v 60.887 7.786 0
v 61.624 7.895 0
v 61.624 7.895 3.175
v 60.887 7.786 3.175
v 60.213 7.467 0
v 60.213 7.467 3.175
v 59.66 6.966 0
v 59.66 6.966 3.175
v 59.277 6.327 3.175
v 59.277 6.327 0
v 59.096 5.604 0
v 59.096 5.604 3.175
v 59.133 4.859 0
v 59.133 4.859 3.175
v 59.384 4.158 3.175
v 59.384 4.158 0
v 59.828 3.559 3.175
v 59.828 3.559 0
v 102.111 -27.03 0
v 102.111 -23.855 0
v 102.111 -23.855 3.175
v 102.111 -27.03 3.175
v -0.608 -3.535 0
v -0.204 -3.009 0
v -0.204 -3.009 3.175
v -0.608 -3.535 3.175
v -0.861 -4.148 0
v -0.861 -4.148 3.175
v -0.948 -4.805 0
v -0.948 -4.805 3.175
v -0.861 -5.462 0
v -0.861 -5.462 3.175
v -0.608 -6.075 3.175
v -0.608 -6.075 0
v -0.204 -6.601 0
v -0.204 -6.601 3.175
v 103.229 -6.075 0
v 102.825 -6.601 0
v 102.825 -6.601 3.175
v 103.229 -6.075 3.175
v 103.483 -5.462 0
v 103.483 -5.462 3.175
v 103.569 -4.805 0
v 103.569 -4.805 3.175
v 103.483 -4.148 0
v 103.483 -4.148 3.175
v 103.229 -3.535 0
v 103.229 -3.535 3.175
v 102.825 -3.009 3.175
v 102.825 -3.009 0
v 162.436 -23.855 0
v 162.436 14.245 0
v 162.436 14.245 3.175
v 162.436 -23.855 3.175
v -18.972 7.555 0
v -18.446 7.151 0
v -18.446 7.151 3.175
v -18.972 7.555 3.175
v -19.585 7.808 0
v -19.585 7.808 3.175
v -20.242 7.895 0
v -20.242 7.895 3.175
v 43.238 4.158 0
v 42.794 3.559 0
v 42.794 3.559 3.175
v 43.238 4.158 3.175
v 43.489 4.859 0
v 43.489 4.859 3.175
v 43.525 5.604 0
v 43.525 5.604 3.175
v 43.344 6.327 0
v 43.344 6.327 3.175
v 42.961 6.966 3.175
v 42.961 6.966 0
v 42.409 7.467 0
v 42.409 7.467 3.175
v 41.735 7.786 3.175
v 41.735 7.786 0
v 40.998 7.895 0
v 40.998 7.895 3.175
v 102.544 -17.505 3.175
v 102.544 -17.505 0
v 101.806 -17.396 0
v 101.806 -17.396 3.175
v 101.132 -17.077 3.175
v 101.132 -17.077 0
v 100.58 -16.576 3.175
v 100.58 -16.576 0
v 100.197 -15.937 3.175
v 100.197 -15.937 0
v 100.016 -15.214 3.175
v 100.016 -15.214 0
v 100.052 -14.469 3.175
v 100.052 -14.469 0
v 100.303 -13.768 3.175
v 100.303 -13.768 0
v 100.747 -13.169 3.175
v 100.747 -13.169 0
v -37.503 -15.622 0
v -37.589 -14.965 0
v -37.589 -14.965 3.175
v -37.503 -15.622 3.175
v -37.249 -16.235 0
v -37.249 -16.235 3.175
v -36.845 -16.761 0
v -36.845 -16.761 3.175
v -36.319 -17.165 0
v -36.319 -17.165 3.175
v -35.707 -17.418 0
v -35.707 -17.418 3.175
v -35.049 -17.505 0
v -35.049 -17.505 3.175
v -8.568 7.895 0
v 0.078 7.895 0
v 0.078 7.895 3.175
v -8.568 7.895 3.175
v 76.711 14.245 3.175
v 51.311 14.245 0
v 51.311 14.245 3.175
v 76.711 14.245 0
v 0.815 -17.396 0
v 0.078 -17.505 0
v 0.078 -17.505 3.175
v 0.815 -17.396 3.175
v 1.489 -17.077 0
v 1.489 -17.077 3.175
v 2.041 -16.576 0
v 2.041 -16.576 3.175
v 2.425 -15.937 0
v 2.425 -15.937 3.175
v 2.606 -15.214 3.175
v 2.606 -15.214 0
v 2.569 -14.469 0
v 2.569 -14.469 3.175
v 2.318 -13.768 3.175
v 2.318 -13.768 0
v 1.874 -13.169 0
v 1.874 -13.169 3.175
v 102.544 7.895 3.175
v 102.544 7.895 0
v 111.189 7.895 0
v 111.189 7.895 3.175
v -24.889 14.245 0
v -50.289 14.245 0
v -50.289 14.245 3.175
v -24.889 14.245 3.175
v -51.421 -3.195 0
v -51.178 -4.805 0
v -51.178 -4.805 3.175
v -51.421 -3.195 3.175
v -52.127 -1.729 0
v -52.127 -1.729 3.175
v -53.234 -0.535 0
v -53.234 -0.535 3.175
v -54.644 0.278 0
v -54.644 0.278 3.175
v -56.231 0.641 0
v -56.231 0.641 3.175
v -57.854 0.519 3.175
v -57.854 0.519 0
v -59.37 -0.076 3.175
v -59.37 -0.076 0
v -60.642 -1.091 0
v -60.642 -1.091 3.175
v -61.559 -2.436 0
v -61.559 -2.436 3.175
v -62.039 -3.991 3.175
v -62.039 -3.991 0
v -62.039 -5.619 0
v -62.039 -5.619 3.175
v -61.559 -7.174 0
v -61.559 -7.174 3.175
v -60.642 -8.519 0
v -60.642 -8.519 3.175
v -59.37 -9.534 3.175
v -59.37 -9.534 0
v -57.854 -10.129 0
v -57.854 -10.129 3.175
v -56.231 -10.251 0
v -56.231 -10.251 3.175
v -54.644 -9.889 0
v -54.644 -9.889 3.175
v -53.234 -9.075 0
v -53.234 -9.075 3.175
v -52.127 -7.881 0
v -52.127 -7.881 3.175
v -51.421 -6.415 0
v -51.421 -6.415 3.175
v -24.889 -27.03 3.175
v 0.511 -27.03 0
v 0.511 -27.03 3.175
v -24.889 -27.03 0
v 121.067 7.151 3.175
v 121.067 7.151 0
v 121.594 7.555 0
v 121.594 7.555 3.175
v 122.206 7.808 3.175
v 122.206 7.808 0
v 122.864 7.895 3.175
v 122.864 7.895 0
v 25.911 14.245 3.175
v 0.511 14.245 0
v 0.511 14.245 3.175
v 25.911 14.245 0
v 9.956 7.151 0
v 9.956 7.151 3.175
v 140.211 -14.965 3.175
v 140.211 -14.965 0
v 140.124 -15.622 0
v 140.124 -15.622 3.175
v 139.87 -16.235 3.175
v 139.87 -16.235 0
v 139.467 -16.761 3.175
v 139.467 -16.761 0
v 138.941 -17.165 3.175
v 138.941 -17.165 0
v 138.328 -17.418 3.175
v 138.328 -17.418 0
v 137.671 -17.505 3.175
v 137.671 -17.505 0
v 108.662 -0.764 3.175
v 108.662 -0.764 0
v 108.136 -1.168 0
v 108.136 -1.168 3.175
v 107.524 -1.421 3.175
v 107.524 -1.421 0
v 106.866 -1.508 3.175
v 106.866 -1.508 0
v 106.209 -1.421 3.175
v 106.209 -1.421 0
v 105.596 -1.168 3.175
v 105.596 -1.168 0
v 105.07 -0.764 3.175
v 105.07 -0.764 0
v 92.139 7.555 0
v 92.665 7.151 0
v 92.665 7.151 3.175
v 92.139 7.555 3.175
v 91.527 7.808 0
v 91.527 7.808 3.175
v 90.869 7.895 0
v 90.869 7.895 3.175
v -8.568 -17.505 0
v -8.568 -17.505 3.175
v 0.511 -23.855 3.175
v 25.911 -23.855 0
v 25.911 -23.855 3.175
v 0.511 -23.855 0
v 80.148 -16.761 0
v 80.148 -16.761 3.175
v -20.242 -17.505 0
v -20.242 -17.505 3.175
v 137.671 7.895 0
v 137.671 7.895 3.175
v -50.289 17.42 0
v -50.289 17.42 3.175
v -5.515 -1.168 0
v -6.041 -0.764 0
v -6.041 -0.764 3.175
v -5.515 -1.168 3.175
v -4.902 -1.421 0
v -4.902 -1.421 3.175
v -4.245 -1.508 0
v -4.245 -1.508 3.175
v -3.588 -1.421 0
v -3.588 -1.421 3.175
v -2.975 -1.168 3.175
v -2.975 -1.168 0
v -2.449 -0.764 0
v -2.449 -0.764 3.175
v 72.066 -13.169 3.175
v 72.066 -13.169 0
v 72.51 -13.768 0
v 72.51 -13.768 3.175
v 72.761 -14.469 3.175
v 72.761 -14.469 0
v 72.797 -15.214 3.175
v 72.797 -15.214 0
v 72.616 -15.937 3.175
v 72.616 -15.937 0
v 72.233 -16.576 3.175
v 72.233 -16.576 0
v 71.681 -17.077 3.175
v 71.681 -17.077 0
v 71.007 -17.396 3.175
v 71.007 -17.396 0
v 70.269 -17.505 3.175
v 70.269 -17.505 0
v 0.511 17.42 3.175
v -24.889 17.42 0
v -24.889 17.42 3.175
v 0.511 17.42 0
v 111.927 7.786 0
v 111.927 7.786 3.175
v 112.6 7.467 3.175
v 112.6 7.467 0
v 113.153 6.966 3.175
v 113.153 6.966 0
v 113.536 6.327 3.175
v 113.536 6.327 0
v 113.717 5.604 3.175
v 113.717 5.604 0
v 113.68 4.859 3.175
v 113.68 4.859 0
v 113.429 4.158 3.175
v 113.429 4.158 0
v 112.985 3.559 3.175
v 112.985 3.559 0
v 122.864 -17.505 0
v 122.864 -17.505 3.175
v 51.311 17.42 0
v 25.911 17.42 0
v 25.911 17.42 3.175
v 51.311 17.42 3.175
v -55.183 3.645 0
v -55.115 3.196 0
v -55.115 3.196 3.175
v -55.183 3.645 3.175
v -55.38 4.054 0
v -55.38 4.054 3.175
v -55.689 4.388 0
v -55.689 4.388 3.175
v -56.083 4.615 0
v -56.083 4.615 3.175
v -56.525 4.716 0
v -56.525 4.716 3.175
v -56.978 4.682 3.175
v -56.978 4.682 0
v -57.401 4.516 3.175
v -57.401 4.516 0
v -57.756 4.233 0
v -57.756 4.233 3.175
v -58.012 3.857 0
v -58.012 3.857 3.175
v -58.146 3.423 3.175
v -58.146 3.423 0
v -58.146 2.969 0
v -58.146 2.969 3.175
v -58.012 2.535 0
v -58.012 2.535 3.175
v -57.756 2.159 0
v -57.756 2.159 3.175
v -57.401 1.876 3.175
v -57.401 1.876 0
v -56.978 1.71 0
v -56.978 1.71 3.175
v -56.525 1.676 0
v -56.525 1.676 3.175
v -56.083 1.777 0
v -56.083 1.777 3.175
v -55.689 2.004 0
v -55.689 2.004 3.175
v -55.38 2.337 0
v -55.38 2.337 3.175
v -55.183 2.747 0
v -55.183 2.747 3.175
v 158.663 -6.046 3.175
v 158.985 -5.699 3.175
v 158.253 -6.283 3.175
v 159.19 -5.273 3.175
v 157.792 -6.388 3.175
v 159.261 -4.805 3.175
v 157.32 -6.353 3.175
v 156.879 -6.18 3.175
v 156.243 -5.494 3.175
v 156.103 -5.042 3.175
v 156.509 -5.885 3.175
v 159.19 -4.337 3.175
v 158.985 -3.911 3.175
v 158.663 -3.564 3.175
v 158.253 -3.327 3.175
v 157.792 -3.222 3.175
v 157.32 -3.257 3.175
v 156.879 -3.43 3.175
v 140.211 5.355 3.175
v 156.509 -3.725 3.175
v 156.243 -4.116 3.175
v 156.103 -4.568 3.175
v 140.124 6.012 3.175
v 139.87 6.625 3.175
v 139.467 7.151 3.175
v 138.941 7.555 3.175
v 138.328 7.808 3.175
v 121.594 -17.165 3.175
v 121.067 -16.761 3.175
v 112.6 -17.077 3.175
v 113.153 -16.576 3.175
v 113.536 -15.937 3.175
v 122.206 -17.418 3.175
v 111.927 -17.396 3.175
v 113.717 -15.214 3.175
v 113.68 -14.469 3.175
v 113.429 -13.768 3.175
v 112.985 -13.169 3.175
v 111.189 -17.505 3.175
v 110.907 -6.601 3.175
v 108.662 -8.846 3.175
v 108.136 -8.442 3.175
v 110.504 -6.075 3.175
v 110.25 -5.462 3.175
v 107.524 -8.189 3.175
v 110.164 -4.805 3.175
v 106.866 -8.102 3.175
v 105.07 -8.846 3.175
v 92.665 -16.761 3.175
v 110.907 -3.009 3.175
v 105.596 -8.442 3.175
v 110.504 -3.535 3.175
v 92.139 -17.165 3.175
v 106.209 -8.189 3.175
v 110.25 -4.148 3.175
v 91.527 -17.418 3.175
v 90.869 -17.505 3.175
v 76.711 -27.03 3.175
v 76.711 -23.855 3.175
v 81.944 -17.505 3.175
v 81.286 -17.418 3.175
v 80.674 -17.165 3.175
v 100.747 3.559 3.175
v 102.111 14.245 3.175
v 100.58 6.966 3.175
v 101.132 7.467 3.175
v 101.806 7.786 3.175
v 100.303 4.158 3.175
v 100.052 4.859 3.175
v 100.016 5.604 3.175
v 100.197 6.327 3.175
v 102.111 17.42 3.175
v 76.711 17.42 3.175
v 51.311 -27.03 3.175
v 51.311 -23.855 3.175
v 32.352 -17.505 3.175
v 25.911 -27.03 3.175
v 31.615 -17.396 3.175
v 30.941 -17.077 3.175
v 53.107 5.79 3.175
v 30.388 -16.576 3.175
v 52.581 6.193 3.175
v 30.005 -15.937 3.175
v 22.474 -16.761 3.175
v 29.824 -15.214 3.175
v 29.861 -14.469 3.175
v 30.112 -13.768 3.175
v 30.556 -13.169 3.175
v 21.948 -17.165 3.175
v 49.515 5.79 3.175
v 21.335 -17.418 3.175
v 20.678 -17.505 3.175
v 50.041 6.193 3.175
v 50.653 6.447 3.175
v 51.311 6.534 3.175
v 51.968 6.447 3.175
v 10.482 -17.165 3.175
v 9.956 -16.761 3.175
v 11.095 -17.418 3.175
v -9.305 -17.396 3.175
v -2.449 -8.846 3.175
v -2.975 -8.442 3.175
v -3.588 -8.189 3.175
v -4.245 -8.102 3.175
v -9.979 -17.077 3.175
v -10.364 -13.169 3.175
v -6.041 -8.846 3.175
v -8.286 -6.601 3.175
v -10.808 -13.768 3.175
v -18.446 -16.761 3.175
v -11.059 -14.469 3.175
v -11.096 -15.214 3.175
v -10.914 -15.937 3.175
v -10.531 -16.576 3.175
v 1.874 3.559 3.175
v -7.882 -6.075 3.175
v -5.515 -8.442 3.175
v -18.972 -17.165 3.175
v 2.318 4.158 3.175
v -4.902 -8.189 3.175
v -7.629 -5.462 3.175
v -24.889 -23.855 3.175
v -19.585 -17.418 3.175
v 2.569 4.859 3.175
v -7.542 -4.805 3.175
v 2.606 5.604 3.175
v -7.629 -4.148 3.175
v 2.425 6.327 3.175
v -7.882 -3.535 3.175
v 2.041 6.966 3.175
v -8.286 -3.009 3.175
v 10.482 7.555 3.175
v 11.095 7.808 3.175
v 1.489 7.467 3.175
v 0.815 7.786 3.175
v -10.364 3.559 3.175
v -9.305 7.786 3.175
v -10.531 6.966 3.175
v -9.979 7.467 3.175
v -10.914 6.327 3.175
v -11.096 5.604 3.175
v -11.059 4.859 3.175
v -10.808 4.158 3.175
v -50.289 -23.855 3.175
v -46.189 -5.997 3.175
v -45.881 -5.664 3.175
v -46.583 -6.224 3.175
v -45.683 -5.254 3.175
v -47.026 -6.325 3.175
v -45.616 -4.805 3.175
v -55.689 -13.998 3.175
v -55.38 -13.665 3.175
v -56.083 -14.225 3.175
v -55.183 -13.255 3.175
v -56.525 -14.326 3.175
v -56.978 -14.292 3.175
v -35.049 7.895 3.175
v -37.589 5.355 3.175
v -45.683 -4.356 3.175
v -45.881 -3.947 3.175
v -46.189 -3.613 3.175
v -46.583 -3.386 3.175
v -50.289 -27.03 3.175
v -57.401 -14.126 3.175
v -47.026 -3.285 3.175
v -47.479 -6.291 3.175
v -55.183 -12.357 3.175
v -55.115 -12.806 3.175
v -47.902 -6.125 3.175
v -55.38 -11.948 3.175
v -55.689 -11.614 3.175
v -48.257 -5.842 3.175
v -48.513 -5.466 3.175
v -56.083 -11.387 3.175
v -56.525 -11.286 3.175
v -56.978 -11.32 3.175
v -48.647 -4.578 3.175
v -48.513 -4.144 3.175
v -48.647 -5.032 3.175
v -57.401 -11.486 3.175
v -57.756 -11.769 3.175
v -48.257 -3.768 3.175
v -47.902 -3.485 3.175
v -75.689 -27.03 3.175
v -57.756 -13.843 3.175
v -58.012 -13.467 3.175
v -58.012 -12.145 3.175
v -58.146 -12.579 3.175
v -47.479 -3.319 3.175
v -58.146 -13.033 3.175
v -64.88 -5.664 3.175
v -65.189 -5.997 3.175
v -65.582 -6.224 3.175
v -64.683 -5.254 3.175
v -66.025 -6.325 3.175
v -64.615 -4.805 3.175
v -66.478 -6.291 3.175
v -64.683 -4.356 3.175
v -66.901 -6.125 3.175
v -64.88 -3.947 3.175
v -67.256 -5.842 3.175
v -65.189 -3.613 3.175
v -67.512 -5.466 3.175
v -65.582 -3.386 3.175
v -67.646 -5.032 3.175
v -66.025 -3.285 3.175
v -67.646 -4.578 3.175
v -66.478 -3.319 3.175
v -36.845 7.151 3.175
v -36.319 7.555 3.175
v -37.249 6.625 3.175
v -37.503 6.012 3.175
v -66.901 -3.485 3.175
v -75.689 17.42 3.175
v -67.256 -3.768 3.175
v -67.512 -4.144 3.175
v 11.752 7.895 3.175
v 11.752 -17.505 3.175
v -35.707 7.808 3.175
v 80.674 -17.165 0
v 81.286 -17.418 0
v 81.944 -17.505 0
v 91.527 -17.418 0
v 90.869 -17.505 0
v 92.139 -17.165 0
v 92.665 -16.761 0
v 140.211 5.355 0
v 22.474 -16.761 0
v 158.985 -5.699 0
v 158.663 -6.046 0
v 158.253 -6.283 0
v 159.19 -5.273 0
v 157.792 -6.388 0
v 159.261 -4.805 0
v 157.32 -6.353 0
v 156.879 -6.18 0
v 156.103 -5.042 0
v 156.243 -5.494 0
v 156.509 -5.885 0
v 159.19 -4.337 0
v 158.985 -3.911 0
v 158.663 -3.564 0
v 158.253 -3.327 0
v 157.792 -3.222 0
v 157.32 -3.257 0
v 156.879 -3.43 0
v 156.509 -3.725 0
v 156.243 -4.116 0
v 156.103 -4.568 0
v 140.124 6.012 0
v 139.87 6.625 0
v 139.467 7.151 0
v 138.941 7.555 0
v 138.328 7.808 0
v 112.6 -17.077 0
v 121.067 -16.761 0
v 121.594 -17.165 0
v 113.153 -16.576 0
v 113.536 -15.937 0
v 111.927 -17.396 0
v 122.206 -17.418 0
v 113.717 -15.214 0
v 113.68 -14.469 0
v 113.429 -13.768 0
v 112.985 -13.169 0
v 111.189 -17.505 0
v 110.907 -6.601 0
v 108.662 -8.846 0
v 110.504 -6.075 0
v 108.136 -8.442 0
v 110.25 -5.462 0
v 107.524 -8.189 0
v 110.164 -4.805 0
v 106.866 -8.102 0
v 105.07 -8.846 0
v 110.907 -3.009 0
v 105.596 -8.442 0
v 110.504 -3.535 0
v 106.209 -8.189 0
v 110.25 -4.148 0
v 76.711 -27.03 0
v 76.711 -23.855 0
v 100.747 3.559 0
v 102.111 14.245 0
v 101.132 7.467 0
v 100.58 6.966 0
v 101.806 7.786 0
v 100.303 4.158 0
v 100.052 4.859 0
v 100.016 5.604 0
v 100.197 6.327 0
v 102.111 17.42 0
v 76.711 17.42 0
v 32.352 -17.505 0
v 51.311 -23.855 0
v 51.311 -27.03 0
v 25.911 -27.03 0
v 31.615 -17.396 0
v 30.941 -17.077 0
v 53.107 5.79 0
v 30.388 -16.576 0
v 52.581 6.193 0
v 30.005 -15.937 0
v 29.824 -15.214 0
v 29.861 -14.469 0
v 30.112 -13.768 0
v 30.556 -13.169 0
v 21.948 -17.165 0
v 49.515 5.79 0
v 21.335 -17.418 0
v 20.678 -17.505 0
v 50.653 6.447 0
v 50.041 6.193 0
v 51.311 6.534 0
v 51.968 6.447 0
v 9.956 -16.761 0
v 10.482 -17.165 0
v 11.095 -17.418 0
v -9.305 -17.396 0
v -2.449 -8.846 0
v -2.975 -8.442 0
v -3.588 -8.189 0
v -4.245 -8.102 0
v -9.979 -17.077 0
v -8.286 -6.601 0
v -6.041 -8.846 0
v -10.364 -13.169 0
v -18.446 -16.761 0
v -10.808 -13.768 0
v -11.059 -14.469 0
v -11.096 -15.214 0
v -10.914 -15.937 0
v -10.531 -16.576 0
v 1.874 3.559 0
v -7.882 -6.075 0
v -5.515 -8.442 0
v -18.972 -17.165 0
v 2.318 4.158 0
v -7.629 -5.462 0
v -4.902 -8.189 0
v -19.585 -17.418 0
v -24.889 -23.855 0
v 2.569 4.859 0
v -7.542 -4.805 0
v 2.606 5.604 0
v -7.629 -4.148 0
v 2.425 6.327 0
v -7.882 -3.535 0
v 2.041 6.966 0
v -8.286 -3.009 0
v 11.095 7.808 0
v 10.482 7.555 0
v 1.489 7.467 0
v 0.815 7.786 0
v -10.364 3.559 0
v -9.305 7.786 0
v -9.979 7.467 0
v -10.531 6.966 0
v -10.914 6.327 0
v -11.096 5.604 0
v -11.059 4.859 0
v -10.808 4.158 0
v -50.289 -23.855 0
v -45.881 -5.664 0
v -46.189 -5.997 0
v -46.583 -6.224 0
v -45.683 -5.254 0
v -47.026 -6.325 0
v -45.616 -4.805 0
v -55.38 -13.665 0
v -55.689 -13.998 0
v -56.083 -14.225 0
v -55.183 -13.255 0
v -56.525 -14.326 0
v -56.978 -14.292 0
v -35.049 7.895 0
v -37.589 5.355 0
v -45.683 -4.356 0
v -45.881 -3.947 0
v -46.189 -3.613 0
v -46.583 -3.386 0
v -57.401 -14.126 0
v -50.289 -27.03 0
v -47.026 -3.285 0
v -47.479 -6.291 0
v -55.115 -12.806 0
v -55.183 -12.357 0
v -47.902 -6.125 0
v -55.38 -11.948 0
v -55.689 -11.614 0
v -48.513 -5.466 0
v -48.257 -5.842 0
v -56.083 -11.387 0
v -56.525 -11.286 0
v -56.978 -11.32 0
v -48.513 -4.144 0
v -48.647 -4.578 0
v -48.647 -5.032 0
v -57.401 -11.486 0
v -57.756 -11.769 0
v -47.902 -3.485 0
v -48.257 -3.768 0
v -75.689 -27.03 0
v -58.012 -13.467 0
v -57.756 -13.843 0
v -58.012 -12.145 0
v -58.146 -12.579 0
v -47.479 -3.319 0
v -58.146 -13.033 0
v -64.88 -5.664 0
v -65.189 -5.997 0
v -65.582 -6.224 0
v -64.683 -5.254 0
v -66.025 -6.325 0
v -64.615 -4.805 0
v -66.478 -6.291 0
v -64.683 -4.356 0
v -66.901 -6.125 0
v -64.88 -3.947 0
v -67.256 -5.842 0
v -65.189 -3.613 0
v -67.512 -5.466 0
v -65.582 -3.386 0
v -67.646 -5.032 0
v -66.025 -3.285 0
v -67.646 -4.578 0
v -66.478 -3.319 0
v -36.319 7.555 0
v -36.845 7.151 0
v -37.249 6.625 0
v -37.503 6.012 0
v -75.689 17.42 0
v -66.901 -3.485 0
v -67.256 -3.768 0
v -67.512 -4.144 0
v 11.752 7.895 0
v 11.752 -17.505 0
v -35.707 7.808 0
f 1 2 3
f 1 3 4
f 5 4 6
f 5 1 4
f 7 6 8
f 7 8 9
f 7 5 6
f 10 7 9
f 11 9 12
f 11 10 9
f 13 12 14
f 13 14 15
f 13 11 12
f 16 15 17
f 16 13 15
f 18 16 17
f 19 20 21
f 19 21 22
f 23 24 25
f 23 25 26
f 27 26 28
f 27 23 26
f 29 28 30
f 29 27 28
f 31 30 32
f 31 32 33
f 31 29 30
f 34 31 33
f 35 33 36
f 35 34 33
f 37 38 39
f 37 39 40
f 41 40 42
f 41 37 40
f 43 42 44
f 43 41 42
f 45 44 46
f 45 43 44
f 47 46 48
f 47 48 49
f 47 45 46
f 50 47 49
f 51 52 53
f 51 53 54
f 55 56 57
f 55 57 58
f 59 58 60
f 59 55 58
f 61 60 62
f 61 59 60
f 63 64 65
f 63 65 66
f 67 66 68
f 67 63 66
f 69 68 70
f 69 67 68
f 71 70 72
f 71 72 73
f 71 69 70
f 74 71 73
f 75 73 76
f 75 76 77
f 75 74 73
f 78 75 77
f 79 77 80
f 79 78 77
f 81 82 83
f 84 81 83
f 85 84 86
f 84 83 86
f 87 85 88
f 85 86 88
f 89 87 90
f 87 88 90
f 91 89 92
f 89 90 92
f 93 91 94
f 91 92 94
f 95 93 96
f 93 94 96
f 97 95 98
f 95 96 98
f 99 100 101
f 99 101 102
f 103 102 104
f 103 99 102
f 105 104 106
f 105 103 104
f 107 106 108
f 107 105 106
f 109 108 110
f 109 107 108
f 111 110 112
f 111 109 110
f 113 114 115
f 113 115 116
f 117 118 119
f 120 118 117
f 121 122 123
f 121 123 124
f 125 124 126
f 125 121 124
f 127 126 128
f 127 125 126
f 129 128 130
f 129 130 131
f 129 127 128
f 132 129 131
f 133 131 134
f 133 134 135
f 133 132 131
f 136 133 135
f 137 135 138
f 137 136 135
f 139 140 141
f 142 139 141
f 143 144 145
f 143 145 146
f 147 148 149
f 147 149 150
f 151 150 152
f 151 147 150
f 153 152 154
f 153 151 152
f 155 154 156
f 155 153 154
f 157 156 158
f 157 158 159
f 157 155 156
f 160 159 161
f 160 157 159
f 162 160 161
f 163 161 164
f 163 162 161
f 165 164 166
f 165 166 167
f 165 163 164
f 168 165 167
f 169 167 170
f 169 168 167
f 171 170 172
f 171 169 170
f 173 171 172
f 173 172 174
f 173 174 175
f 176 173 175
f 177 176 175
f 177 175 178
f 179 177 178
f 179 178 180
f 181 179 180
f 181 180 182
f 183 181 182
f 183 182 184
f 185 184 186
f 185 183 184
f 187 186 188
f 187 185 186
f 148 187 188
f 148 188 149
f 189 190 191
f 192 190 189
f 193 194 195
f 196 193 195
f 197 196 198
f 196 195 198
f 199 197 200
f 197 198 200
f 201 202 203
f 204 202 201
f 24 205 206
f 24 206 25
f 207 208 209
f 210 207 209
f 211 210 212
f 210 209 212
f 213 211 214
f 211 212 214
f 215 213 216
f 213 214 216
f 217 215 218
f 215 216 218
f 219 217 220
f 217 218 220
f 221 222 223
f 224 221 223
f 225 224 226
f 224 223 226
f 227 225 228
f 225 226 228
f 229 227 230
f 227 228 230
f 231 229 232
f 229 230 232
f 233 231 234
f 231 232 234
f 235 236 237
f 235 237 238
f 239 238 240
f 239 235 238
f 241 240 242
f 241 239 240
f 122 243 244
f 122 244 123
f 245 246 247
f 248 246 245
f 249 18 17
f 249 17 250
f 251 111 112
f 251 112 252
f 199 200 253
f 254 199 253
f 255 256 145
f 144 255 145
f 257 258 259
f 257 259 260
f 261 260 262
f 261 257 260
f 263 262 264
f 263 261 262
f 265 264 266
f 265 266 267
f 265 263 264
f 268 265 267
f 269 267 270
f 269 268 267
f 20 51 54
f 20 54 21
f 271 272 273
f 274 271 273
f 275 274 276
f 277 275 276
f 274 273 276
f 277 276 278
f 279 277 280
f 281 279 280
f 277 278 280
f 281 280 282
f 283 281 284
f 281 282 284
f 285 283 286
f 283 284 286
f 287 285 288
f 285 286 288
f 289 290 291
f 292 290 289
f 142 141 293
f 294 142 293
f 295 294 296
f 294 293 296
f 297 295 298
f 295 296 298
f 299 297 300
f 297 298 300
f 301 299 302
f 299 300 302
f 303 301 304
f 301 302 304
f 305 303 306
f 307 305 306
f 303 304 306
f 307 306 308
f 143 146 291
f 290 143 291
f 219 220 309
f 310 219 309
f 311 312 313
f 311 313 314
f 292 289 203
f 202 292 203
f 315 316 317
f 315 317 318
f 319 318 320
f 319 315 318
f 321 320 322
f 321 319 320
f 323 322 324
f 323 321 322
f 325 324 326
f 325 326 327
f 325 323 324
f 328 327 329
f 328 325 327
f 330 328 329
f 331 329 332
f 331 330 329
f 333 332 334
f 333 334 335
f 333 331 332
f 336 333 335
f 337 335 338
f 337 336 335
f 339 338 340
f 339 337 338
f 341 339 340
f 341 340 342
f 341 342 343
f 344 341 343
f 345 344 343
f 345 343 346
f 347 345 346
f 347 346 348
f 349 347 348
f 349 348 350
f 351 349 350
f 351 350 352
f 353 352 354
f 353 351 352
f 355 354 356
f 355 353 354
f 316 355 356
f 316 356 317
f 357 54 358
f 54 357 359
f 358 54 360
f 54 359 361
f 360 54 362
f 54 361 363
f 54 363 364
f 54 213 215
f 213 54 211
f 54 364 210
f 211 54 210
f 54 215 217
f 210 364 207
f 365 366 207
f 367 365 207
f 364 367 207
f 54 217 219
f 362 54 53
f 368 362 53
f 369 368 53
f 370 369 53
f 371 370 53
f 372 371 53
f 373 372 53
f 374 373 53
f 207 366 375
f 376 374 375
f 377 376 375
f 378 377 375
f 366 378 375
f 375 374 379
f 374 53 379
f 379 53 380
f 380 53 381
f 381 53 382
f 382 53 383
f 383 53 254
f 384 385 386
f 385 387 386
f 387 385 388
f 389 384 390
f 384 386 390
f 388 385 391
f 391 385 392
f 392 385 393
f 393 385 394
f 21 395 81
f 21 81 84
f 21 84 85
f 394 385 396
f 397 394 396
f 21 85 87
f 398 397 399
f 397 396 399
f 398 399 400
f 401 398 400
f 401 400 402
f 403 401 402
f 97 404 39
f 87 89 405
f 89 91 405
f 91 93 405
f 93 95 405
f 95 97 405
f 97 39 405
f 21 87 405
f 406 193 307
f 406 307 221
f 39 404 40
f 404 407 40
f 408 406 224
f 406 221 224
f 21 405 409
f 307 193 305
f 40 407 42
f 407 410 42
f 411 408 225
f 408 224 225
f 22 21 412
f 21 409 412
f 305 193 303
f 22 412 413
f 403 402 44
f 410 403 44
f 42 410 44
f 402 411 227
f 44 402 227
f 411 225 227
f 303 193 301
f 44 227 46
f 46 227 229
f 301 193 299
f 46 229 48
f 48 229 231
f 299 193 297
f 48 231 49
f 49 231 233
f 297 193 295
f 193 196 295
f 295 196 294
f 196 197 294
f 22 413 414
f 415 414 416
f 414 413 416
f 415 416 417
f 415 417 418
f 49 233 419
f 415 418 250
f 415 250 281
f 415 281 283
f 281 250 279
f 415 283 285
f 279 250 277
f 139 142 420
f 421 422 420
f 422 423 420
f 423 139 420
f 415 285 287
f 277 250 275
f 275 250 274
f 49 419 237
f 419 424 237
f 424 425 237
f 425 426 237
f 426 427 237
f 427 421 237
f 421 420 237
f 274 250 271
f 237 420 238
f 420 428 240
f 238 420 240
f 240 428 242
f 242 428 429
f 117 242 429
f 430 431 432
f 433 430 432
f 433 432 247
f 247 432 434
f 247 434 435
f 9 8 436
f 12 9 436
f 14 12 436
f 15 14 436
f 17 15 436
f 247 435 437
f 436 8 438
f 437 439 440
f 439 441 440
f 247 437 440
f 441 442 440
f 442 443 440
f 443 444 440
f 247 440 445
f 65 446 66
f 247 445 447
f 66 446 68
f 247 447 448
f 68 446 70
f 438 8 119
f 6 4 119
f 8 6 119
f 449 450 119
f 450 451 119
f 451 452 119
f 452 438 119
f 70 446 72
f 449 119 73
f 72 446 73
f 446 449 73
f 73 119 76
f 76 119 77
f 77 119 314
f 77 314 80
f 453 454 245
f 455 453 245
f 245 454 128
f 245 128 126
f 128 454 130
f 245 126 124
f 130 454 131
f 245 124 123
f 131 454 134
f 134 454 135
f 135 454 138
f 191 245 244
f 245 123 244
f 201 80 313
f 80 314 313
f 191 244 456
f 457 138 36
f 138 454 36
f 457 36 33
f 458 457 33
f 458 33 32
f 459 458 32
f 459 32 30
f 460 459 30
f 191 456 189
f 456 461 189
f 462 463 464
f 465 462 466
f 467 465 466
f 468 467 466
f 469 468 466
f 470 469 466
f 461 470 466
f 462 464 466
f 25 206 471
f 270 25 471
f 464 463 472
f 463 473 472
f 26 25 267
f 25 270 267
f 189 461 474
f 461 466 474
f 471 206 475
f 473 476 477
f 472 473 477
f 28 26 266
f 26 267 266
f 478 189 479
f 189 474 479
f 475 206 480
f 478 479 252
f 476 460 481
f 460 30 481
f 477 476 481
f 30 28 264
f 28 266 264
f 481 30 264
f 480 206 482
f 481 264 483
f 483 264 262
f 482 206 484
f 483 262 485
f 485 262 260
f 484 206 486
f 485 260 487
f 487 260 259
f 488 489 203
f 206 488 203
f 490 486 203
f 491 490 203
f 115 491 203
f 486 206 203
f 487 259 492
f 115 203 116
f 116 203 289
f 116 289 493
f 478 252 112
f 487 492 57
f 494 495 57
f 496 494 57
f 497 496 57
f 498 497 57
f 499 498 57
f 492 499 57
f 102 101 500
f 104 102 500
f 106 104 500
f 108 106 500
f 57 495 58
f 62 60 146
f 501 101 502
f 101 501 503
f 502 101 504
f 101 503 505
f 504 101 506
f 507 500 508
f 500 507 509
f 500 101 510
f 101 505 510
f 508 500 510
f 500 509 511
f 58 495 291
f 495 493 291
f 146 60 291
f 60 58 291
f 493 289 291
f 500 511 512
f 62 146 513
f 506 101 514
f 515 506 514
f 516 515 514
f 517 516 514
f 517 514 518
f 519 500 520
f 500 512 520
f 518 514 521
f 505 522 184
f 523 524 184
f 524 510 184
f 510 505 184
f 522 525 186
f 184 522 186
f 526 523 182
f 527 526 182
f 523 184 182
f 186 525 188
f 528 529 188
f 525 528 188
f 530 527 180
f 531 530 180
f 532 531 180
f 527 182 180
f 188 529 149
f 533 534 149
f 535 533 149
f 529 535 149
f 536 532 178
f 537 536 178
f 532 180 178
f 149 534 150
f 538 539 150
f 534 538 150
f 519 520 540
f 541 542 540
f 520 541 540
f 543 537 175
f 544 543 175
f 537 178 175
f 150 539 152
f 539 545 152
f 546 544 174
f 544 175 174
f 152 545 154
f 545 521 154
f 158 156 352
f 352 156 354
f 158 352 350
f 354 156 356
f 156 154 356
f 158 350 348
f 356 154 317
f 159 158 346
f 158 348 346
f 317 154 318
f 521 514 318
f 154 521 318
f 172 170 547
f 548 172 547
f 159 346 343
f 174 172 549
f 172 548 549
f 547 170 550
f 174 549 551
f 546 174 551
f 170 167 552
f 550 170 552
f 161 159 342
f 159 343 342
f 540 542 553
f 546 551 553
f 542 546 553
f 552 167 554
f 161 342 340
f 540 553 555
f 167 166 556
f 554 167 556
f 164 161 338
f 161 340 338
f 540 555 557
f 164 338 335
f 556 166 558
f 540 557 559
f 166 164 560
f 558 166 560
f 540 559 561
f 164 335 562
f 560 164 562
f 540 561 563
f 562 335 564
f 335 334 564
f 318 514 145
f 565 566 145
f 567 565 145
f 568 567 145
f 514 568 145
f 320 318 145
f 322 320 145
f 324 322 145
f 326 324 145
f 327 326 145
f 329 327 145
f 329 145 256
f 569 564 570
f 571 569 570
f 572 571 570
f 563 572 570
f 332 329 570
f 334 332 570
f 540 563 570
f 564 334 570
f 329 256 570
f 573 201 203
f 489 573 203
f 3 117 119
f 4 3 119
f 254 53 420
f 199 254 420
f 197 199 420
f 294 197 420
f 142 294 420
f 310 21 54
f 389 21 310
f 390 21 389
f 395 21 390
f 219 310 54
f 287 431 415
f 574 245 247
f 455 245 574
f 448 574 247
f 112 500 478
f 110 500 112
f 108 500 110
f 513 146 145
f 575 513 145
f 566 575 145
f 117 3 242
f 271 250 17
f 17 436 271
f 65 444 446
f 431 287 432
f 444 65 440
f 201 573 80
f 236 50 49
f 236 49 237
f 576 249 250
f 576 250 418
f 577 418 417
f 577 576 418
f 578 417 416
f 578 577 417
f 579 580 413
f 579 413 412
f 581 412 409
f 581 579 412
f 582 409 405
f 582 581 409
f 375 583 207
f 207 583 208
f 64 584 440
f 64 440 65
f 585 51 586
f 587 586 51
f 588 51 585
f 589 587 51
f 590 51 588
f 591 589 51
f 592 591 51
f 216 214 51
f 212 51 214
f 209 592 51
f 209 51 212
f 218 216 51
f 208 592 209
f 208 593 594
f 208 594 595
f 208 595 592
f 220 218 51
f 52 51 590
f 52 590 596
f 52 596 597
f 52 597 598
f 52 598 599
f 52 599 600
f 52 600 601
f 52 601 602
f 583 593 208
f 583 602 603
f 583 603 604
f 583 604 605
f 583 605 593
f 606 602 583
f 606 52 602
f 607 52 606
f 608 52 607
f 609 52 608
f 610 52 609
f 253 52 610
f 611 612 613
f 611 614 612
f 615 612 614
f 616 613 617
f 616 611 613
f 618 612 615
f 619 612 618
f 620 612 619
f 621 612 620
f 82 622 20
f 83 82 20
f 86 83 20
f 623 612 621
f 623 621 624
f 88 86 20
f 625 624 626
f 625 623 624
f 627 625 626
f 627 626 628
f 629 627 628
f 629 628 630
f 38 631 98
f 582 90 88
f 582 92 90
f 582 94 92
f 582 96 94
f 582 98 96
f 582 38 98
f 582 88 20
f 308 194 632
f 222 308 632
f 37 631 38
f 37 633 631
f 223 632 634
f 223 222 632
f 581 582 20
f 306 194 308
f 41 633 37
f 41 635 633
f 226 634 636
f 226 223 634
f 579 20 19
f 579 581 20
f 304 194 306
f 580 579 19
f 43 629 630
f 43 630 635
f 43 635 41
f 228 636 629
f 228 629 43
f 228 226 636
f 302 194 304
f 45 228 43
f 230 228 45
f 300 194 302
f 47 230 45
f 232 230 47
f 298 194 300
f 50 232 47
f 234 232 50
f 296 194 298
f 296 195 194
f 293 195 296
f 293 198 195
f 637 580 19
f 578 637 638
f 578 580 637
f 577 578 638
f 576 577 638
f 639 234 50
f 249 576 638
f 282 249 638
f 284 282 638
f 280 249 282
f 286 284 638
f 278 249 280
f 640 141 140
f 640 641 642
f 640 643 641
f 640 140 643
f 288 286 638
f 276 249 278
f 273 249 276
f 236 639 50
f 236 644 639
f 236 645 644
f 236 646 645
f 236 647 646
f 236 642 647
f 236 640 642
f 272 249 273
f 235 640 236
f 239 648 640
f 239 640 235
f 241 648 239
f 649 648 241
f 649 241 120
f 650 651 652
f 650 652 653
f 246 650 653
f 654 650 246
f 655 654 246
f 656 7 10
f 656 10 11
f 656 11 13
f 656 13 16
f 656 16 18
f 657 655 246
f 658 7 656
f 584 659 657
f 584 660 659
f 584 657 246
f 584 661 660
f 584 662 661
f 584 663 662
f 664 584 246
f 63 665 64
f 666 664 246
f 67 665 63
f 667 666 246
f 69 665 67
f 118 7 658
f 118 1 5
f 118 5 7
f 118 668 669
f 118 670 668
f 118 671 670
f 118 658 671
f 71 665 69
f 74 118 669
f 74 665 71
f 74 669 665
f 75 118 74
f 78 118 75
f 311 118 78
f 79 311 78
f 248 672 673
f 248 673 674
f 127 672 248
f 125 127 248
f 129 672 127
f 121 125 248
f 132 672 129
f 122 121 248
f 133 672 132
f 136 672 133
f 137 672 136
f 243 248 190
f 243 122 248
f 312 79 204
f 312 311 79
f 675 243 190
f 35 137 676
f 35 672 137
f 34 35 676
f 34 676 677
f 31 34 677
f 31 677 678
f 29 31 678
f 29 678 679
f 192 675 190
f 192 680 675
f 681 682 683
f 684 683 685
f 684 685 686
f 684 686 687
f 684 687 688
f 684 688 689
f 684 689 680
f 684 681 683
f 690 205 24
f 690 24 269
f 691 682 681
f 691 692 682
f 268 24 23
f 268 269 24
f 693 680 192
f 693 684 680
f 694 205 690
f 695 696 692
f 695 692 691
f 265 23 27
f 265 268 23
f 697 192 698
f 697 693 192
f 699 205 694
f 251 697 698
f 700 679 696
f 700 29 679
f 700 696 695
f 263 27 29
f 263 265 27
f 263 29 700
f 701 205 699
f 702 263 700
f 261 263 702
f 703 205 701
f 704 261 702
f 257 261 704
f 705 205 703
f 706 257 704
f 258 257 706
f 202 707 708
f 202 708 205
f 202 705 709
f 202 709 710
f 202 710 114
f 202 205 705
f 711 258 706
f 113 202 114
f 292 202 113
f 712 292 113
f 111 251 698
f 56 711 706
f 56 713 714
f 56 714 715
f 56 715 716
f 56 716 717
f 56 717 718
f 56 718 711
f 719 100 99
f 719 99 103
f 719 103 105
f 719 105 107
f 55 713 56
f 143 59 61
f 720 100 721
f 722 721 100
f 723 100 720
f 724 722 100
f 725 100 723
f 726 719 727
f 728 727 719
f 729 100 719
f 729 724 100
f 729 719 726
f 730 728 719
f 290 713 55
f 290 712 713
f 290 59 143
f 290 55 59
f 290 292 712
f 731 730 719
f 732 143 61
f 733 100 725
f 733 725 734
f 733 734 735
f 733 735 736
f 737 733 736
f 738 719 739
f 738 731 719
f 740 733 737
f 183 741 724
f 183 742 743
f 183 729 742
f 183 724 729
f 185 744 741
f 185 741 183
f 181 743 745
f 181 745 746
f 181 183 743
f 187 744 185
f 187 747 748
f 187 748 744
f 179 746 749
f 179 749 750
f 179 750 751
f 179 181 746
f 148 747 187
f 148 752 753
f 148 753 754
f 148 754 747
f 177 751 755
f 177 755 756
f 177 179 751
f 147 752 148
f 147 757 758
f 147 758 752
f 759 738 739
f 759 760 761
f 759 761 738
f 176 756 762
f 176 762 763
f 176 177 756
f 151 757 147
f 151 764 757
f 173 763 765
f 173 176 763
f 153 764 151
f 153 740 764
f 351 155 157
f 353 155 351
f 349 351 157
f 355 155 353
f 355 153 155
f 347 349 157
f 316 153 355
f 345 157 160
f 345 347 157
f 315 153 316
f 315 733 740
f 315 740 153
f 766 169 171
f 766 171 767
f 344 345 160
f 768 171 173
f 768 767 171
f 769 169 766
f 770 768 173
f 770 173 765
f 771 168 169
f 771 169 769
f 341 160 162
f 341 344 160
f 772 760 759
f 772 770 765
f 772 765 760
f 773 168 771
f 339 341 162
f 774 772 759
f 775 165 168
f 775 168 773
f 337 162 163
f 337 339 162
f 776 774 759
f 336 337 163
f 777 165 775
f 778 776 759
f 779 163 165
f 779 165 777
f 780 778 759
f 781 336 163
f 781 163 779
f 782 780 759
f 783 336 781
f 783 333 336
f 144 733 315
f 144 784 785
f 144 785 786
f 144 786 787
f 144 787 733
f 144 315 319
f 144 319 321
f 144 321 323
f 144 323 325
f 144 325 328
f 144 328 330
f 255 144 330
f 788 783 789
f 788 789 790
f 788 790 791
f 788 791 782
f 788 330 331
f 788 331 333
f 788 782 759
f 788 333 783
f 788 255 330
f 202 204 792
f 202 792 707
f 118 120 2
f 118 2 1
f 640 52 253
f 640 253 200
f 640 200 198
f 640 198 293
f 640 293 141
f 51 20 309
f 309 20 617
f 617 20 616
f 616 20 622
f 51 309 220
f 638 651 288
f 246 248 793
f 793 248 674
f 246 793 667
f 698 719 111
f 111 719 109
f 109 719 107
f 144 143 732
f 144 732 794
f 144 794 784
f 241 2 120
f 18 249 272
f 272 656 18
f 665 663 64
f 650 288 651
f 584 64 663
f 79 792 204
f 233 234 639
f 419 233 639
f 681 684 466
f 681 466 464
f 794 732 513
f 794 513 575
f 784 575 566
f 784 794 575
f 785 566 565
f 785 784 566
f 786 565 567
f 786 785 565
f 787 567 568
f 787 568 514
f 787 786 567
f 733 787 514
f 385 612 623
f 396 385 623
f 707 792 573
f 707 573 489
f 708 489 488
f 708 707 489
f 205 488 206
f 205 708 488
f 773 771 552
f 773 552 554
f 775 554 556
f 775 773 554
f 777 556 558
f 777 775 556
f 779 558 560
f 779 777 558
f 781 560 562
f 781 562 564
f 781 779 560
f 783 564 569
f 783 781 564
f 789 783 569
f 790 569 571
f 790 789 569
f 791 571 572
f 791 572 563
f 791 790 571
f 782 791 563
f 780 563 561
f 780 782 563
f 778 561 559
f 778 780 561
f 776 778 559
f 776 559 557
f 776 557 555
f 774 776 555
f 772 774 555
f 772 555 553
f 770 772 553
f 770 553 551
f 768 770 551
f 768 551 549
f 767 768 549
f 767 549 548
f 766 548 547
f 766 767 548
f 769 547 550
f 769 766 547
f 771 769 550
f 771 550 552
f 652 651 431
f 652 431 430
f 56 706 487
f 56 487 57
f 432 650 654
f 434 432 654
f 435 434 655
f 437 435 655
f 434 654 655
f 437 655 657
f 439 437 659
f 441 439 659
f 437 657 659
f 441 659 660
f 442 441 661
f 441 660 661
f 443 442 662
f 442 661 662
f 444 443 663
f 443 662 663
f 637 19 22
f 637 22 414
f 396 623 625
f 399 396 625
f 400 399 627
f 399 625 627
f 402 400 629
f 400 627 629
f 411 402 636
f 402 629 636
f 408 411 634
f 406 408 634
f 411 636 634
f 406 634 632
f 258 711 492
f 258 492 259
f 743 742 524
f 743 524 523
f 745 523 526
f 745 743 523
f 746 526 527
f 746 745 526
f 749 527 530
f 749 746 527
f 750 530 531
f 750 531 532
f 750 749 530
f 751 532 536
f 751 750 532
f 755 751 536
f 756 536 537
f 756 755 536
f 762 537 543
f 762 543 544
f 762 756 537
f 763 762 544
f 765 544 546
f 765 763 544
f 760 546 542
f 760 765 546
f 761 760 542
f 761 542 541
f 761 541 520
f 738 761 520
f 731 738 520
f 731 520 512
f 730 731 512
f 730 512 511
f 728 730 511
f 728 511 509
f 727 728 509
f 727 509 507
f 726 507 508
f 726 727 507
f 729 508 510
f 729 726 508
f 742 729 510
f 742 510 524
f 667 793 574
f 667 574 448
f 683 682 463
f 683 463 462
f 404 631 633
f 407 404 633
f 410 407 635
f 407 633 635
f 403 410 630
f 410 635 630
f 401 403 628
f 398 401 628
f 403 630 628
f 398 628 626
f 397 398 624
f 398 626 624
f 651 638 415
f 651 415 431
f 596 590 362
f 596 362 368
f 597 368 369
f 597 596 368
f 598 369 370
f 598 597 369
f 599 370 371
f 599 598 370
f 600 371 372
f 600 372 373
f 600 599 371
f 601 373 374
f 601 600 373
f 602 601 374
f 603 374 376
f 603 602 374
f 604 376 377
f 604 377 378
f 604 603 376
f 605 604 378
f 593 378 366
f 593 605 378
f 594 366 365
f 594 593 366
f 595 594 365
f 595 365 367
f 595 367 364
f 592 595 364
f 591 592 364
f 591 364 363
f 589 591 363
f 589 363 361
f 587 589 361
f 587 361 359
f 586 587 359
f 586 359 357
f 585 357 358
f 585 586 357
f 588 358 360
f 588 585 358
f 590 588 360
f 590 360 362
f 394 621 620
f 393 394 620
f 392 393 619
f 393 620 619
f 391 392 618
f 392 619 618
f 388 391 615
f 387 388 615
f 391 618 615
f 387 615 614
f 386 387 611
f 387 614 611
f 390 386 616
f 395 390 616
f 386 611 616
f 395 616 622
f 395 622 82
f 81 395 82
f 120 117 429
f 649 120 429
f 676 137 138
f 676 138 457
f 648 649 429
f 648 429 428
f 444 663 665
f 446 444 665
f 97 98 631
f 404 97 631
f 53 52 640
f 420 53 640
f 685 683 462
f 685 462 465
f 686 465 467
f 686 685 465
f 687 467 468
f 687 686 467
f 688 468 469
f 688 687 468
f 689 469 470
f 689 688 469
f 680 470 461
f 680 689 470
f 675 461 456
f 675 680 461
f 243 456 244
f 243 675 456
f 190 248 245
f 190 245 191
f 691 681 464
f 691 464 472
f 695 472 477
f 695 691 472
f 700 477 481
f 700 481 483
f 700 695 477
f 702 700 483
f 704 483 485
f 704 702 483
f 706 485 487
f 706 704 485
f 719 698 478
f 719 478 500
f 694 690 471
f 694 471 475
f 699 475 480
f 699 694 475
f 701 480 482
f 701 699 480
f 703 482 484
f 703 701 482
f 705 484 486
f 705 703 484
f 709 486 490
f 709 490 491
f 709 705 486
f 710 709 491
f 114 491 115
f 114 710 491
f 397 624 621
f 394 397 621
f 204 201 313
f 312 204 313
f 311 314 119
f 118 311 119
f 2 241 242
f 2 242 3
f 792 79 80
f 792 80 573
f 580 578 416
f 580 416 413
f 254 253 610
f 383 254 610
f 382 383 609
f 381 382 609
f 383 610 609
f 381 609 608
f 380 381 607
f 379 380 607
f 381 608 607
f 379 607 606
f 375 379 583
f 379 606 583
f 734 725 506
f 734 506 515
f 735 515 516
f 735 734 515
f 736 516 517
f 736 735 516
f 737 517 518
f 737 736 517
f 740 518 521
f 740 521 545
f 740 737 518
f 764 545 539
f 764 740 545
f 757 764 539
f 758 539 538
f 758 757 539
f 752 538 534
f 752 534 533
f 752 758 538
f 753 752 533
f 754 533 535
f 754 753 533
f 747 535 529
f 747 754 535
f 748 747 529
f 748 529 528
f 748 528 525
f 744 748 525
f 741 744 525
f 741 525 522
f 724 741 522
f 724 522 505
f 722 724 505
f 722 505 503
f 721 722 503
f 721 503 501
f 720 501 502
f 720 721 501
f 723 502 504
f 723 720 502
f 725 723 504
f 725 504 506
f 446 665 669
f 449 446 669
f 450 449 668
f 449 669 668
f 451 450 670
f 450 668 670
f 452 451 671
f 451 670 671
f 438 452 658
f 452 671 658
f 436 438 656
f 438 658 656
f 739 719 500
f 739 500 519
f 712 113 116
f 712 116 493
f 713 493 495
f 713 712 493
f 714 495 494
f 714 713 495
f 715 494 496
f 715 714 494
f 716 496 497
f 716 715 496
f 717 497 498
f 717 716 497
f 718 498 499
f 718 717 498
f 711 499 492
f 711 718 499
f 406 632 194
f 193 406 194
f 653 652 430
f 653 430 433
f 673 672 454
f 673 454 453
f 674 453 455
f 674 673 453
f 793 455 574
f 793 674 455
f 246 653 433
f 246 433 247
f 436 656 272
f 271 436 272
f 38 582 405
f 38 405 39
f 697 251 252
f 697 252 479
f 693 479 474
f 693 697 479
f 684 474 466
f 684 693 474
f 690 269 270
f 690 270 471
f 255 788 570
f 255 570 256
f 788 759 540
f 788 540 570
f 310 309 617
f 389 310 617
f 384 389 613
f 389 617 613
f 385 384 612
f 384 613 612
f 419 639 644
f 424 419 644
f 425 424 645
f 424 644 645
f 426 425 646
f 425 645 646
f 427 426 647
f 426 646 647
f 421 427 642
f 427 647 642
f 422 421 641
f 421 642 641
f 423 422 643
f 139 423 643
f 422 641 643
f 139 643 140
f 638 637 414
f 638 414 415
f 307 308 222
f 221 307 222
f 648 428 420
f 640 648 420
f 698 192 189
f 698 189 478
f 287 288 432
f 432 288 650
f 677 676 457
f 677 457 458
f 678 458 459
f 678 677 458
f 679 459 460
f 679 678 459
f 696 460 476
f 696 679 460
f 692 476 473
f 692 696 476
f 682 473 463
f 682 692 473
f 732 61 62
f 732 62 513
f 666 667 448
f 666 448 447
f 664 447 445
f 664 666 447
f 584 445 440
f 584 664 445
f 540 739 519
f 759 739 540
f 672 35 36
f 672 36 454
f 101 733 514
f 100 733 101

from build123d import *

# Parameters (mm, degrees)
SKETCH1_R           = 1.524
SKETCH1_R_2         = 1.5875
SKETCH1_R_3         = 5.461
BOSS_EXTRUDE1_DEPTH = 3.175


with BuildPart() as part:
    # Sketch1 → Boss-Extrude1 (new body)
    with BuildSketch(Plane.XY):
        Polygon((-24.889290425, 17.419992315), (0.510709575, 17.419992315), (0.510709575, 14.244992315), (25.910709575, 14.244992315), (25.910709575, 17.419992315), (51.310709575, 17.419992315), (51.310709575, 14.244992315), (76.710709575, 14.244992315), (76.710709575, 17.419992315), (102.110709575, 17.419992315), (102.110709575, 14.244992315), (152.910709575, 14.244992315), (162.435709575, 14.244992315), (162.435709575, -23.855007685), (102.110709575, -23.855007685), (102.110709575, -27.030007685), (76.710709575, -27.030007685), (76.710709575, -23.855007685), (51.310709575, -23.855007685), (51.310709575, -27.030007685), (25.910709575, -27.030007685), (25.910709575, -23.855007685), (0.510709575, -23.855007685), (0.510709575, -27.030007685), (-24.889290425, -27.030007685), (-24.889290425, -23.855007685), (-50.289290425, -23.855007685), (-50.289290425, -27.030007685), (-75.689290425, -27.030007685), (-75.689290425, 17.419992315), (-50.289290425, 17.419992315), (-50.289290425, 14.244992315), (-24.889290425, 14.244992315), align=None)
        with Locations((-47.139690425, -4.805007685)):
            Circle(SKETCH1_R, mode=Mode.SUBTRACT)
        with Locations((-56.639290425, -12.806007685)):
            Circle(SKETCH1_R, mode=Mode.SUBTRACT)
        with Locations((-56.639290425, 3.195992315)):
            Circle(SKETCH1_R, mode=Mode.SUBTRACT)
        with Locations((-66.138890425, -4.805007685)):
            Circle(SKETCH1_R, mode=Mode.SUBTRACT)
        with Locations((157.673209575, -4.805007685)):
            Circle(SKETCH1_R_2, mode=Mode.SUBTRACT)
        with Locations((-56.639290425, -4.805007685)):
            Circle(SKETCH1_R_3, mode=Mode.SUBTRACT)
        with BuildLine():
            Line((-2.448912015, -0.76389243), (1.873921506, 3.558941091))
            ThreePointArc((1.873921506, 3.558941091), (2.424524294, 6.327008233), (0.077870282, 7.894992315))
            Line((0.077870282, 7.894992315), (-8.567796761, 7.894992315))
            ThreePointArc((-8.567796761, 7.894992315), (-10.914450773, 6.327008233), (-10.363847985, 3.558941091))
            Line((-10.363847985, 3.558941091), (-6.041014464, -0.76389243))
            ThreePointArc((-6.041014464, -0.76389243), (-4.244963239, -1.507841206), (-2.448912015, -0.76389243))
        make_face(mode=Mode.SUBTRACT)
        with BuildLine():
            Line((-8.567796761, -17.505007685), (0.077870282, -17.505007685))
            ThreePointArc((0.077870282, -17.505007685), (2.424524294, -15.937023603), (1.873921506, -13.168956461))
            Line((1.873921506, -13.168956461), (-2.448912015, -8.846122939))
            ThreePointArc((-2.448912015, -8.846122939), (-4.244963239, -8.102174164), (-6.041014464, -8.846122939))
            Line((-6.041014464, -8.846122939), (-10.363847985, -13.168956461))
            ThreePointArc((-10.363847985, -13.168956461), (-10.914450773, -15.937023603), (-8.567796761, -17.505007685))
        make_face(mode=Mode.SUBTRACT)
        with BuildLine():
            Line((-37.589290425, 5.354992315), (-37.589290425, -14.965007685))
            ThreePointArc((-37.589290425, -14.965007685), (-36.845341649, -16.761058909), (-35.049290425, -17.505007685))
            Line((-35.049290425, -17.505007685), (-20.242129718, -17.505007685))
            ThreePointArc((-20.242129718, -17.505007685), (-19.2701138, -17.311661697), (-18.446078494, -16.761058909))
            Line((-18.446078494, -16.761058909), (-8.286078494, -6.601058909))
            ThreePointArc((-8.286078494, -6.601058909), (-7.542129718, -4.805007685), (-8.286078494, -3.008956461))
            Line((-8.286078494, -3.008956461), (-18.446078494, 7.151043539))
            ThreePointArc((-18.446078494, 7.151043539), (-19.2701138, 7.701646328), (-20.242129718, 7.894992315))
            Line((-20.242129718, 7.894992315), (-35.049290425, 7.894992315))
            ThreePointArc((-35.049290425, 7.894992315), (-36.845341649, 7.151043539), (-37.589290425, 5.354992315))
        make_face(mode=Mode.SUBTRACT)
        with BuildLine():
            Line((9.956152015, 7.151043539), (-0.203847985, -3.008956461))
            ThreePointArc((-0.203847985, -3.008956461), (-0.947796761, -4.805007685), (-0.203847985, -6.601058909))
            Line((-0.203847985, -6.601058909), (9.956152015, -16.761058909))
            ThreePointArc((9.956152015, -16.761058909), (10.780187321, -17.311661697), (11.752203239, -17.505007685))
            Line((11.752203239, -17.505007685), (20.677590576, -17.505007685))
            ThreePointArc((20.677590576, -17.505007685), (21.649606495, -17.311661697), (22.473641801, -16.761058909))
            Line((22.473641801, -16.761058909), (42.793641801, 3.558941091))
            ThreePointArc((42.793641801, 3.558941091), (43.344244589, 6.327008233), (40.997590576, 7.894992315))
            Line((40.997590576, 7.894992315), (11.752203239, 7.894992315))
            ThreePointArc((11.752203239, 7.894992315), (10.780187321, 7.701646328), (9.956152015, 7.151043539))
        make_face(mode=Mode.SUBTRACT)
        with BuildLine():
            Line((121.067497644, -16.761058909), (110.907497644, -6.601058909))
            ThreePointArc((110.907497644, -6.601058909), (110.163548868, -4.805007685), (110.907497644, -3.008956461))
            Line((110.907497644, -3.008956461), (121.067497644, 7.151043539))
            ThreePointArc((121.067497644, 7.151043539), (121.89153295, 7.701646328), (122.863548868, 7.894992315))
            Line((122.863548868, 7.894992315), (137.670709575, 7.894992315))
            ThreePointArc((137.670709575, 7.894992315), (139.466760799, 7.151043539), (140.210709575, 5.354992315))
            Line((140.210709575, 5.354992315), (140.210709575, -14.965007685))
            ThreePointArc((140.210709575, -14.965007685), (139.466760799, -16.761058909), (137.670709575, -17.505007685))
            Line((137.670709575, -17.505007685), (122.863548868, -17.505007685))
            ThreePointArc((122.863548868, -17.505007685), (121.89153295, -17.311661697), (121.067497644, -16.761058909))
        make_face(mode=Mode.SUBTRACT)
        with BuildLine():
            Line((90.869215911, 7.894992315), (61.623828574, 7.894992315))
            ThreePointArc((61.623828574, 7.894992315), (59.277174561, 6.327008233), (59.82777735, 3.558941091))
            Line((59.82777735, 3.558941091), (80.14777735, -16.761058909))
            ThreePointArc((80.14777735, -16.761058909), (80.971812656, -17.311661697), (81.943828574, -17.505007685))
            Line((81.943828574, -17.505007685), (90.869215911, -17.505007685))
            ThreePointArc((90.869215911, -17.505007685), (91.841231829, -17.311661697), (92.665267135, -16.761058909))
            Line((92.665267135, -16.761058909), (102.825267135, -6.601058909))
            ThreePointArc((102.825267135, -6.601058909), (103.569215911, -4.805007685), (102.825267135, -3.008956461))
            Line((102.825267135, -3.008956461), (92.665267135, 7.151043539))
            ThreePointArc((92.665267135, 7.151043539), (91.841231829, 7.701646328), (90.869215911, 7.894992315))
        make_face(mode=Mode.SUBTRACT)
        with BuildLine():
            Line((111.189215911, -17.505007685), (102.543548868, -17.505007685))
            ThreePointArc((102.543548868, -17.505007685), (100.196894856, -15.937023603), (100.747497644, -13.168956461))
            Line((100.747497644, -13.168956461), (105.070331165, -8.846122939))
            ThreePointArc((105.070331165, -8.846122939), (106.86638239, -8.102174164), (108.662433614, -8.846122939))
            Line((108.662433614, -8.846122939), (112.985267135, -13.168956461))
            ThreePointArc((112.985267135, -13.168956461), (113.535869924, -15.937023603), (111.189215911, -17.505007685))
        make_face(mode=Mode.SUBTRACT)
        with BuildLine():
            Line((105.070331165, -0.76389243), (100.747497644, 3.558941091))
            ThreePointArc((100.747497644, 3.558941091), (100.196894856, 6.327008233), (102.543548868, 7.894992315))
            Line((102.543548868, 7.894992315), (111.189215911, 7.894992315))
            ThreePointArc((111.189215911, 7.894992315), (113.535869924, 6.327008233), (112.985267135, 3.558941091))
            Line((112.985267135, 3.558941091), (108.662433614, -0.76389243))
            ThreePointArc((108.662433614, -0.76389243), (106.86638239, -1.507841206), (105.070331165, -0.76389243))
        make_face(mode=Mode.SUBTRACT)
        with BuildLine():
            Line((67.742713319, -8.846122939), (72.065546841, -13.168956461))
            ThreePointArc((72.065546841, -13.168956461), (72.616149629, -15.937023603), (70.269495616, -17.505007685))
            Line((70.269495616, -17.505007685), (32.351923534, -17.505007685))
            ThreePointArc((32.351923534, -17.505007685), (30.005269521, -15.937023603), (30.55587231, -13.168956461))
            Line((30.55587231, -13.168956461), (49.514658351, 5.789829581))
            ThreePointArc((49.514658351, 5.789829581), (51.310709575, 6.533778356), (53.106760799, 5.789829581))
            Line((53.106760799, 5.789829581), (67.742713319, -8.846122939))
        make_face(mode=Mode.SUBTRACT)
    extrude(amount=BOSS_EXTRUDE1_DEPTH)


solid = part.part
